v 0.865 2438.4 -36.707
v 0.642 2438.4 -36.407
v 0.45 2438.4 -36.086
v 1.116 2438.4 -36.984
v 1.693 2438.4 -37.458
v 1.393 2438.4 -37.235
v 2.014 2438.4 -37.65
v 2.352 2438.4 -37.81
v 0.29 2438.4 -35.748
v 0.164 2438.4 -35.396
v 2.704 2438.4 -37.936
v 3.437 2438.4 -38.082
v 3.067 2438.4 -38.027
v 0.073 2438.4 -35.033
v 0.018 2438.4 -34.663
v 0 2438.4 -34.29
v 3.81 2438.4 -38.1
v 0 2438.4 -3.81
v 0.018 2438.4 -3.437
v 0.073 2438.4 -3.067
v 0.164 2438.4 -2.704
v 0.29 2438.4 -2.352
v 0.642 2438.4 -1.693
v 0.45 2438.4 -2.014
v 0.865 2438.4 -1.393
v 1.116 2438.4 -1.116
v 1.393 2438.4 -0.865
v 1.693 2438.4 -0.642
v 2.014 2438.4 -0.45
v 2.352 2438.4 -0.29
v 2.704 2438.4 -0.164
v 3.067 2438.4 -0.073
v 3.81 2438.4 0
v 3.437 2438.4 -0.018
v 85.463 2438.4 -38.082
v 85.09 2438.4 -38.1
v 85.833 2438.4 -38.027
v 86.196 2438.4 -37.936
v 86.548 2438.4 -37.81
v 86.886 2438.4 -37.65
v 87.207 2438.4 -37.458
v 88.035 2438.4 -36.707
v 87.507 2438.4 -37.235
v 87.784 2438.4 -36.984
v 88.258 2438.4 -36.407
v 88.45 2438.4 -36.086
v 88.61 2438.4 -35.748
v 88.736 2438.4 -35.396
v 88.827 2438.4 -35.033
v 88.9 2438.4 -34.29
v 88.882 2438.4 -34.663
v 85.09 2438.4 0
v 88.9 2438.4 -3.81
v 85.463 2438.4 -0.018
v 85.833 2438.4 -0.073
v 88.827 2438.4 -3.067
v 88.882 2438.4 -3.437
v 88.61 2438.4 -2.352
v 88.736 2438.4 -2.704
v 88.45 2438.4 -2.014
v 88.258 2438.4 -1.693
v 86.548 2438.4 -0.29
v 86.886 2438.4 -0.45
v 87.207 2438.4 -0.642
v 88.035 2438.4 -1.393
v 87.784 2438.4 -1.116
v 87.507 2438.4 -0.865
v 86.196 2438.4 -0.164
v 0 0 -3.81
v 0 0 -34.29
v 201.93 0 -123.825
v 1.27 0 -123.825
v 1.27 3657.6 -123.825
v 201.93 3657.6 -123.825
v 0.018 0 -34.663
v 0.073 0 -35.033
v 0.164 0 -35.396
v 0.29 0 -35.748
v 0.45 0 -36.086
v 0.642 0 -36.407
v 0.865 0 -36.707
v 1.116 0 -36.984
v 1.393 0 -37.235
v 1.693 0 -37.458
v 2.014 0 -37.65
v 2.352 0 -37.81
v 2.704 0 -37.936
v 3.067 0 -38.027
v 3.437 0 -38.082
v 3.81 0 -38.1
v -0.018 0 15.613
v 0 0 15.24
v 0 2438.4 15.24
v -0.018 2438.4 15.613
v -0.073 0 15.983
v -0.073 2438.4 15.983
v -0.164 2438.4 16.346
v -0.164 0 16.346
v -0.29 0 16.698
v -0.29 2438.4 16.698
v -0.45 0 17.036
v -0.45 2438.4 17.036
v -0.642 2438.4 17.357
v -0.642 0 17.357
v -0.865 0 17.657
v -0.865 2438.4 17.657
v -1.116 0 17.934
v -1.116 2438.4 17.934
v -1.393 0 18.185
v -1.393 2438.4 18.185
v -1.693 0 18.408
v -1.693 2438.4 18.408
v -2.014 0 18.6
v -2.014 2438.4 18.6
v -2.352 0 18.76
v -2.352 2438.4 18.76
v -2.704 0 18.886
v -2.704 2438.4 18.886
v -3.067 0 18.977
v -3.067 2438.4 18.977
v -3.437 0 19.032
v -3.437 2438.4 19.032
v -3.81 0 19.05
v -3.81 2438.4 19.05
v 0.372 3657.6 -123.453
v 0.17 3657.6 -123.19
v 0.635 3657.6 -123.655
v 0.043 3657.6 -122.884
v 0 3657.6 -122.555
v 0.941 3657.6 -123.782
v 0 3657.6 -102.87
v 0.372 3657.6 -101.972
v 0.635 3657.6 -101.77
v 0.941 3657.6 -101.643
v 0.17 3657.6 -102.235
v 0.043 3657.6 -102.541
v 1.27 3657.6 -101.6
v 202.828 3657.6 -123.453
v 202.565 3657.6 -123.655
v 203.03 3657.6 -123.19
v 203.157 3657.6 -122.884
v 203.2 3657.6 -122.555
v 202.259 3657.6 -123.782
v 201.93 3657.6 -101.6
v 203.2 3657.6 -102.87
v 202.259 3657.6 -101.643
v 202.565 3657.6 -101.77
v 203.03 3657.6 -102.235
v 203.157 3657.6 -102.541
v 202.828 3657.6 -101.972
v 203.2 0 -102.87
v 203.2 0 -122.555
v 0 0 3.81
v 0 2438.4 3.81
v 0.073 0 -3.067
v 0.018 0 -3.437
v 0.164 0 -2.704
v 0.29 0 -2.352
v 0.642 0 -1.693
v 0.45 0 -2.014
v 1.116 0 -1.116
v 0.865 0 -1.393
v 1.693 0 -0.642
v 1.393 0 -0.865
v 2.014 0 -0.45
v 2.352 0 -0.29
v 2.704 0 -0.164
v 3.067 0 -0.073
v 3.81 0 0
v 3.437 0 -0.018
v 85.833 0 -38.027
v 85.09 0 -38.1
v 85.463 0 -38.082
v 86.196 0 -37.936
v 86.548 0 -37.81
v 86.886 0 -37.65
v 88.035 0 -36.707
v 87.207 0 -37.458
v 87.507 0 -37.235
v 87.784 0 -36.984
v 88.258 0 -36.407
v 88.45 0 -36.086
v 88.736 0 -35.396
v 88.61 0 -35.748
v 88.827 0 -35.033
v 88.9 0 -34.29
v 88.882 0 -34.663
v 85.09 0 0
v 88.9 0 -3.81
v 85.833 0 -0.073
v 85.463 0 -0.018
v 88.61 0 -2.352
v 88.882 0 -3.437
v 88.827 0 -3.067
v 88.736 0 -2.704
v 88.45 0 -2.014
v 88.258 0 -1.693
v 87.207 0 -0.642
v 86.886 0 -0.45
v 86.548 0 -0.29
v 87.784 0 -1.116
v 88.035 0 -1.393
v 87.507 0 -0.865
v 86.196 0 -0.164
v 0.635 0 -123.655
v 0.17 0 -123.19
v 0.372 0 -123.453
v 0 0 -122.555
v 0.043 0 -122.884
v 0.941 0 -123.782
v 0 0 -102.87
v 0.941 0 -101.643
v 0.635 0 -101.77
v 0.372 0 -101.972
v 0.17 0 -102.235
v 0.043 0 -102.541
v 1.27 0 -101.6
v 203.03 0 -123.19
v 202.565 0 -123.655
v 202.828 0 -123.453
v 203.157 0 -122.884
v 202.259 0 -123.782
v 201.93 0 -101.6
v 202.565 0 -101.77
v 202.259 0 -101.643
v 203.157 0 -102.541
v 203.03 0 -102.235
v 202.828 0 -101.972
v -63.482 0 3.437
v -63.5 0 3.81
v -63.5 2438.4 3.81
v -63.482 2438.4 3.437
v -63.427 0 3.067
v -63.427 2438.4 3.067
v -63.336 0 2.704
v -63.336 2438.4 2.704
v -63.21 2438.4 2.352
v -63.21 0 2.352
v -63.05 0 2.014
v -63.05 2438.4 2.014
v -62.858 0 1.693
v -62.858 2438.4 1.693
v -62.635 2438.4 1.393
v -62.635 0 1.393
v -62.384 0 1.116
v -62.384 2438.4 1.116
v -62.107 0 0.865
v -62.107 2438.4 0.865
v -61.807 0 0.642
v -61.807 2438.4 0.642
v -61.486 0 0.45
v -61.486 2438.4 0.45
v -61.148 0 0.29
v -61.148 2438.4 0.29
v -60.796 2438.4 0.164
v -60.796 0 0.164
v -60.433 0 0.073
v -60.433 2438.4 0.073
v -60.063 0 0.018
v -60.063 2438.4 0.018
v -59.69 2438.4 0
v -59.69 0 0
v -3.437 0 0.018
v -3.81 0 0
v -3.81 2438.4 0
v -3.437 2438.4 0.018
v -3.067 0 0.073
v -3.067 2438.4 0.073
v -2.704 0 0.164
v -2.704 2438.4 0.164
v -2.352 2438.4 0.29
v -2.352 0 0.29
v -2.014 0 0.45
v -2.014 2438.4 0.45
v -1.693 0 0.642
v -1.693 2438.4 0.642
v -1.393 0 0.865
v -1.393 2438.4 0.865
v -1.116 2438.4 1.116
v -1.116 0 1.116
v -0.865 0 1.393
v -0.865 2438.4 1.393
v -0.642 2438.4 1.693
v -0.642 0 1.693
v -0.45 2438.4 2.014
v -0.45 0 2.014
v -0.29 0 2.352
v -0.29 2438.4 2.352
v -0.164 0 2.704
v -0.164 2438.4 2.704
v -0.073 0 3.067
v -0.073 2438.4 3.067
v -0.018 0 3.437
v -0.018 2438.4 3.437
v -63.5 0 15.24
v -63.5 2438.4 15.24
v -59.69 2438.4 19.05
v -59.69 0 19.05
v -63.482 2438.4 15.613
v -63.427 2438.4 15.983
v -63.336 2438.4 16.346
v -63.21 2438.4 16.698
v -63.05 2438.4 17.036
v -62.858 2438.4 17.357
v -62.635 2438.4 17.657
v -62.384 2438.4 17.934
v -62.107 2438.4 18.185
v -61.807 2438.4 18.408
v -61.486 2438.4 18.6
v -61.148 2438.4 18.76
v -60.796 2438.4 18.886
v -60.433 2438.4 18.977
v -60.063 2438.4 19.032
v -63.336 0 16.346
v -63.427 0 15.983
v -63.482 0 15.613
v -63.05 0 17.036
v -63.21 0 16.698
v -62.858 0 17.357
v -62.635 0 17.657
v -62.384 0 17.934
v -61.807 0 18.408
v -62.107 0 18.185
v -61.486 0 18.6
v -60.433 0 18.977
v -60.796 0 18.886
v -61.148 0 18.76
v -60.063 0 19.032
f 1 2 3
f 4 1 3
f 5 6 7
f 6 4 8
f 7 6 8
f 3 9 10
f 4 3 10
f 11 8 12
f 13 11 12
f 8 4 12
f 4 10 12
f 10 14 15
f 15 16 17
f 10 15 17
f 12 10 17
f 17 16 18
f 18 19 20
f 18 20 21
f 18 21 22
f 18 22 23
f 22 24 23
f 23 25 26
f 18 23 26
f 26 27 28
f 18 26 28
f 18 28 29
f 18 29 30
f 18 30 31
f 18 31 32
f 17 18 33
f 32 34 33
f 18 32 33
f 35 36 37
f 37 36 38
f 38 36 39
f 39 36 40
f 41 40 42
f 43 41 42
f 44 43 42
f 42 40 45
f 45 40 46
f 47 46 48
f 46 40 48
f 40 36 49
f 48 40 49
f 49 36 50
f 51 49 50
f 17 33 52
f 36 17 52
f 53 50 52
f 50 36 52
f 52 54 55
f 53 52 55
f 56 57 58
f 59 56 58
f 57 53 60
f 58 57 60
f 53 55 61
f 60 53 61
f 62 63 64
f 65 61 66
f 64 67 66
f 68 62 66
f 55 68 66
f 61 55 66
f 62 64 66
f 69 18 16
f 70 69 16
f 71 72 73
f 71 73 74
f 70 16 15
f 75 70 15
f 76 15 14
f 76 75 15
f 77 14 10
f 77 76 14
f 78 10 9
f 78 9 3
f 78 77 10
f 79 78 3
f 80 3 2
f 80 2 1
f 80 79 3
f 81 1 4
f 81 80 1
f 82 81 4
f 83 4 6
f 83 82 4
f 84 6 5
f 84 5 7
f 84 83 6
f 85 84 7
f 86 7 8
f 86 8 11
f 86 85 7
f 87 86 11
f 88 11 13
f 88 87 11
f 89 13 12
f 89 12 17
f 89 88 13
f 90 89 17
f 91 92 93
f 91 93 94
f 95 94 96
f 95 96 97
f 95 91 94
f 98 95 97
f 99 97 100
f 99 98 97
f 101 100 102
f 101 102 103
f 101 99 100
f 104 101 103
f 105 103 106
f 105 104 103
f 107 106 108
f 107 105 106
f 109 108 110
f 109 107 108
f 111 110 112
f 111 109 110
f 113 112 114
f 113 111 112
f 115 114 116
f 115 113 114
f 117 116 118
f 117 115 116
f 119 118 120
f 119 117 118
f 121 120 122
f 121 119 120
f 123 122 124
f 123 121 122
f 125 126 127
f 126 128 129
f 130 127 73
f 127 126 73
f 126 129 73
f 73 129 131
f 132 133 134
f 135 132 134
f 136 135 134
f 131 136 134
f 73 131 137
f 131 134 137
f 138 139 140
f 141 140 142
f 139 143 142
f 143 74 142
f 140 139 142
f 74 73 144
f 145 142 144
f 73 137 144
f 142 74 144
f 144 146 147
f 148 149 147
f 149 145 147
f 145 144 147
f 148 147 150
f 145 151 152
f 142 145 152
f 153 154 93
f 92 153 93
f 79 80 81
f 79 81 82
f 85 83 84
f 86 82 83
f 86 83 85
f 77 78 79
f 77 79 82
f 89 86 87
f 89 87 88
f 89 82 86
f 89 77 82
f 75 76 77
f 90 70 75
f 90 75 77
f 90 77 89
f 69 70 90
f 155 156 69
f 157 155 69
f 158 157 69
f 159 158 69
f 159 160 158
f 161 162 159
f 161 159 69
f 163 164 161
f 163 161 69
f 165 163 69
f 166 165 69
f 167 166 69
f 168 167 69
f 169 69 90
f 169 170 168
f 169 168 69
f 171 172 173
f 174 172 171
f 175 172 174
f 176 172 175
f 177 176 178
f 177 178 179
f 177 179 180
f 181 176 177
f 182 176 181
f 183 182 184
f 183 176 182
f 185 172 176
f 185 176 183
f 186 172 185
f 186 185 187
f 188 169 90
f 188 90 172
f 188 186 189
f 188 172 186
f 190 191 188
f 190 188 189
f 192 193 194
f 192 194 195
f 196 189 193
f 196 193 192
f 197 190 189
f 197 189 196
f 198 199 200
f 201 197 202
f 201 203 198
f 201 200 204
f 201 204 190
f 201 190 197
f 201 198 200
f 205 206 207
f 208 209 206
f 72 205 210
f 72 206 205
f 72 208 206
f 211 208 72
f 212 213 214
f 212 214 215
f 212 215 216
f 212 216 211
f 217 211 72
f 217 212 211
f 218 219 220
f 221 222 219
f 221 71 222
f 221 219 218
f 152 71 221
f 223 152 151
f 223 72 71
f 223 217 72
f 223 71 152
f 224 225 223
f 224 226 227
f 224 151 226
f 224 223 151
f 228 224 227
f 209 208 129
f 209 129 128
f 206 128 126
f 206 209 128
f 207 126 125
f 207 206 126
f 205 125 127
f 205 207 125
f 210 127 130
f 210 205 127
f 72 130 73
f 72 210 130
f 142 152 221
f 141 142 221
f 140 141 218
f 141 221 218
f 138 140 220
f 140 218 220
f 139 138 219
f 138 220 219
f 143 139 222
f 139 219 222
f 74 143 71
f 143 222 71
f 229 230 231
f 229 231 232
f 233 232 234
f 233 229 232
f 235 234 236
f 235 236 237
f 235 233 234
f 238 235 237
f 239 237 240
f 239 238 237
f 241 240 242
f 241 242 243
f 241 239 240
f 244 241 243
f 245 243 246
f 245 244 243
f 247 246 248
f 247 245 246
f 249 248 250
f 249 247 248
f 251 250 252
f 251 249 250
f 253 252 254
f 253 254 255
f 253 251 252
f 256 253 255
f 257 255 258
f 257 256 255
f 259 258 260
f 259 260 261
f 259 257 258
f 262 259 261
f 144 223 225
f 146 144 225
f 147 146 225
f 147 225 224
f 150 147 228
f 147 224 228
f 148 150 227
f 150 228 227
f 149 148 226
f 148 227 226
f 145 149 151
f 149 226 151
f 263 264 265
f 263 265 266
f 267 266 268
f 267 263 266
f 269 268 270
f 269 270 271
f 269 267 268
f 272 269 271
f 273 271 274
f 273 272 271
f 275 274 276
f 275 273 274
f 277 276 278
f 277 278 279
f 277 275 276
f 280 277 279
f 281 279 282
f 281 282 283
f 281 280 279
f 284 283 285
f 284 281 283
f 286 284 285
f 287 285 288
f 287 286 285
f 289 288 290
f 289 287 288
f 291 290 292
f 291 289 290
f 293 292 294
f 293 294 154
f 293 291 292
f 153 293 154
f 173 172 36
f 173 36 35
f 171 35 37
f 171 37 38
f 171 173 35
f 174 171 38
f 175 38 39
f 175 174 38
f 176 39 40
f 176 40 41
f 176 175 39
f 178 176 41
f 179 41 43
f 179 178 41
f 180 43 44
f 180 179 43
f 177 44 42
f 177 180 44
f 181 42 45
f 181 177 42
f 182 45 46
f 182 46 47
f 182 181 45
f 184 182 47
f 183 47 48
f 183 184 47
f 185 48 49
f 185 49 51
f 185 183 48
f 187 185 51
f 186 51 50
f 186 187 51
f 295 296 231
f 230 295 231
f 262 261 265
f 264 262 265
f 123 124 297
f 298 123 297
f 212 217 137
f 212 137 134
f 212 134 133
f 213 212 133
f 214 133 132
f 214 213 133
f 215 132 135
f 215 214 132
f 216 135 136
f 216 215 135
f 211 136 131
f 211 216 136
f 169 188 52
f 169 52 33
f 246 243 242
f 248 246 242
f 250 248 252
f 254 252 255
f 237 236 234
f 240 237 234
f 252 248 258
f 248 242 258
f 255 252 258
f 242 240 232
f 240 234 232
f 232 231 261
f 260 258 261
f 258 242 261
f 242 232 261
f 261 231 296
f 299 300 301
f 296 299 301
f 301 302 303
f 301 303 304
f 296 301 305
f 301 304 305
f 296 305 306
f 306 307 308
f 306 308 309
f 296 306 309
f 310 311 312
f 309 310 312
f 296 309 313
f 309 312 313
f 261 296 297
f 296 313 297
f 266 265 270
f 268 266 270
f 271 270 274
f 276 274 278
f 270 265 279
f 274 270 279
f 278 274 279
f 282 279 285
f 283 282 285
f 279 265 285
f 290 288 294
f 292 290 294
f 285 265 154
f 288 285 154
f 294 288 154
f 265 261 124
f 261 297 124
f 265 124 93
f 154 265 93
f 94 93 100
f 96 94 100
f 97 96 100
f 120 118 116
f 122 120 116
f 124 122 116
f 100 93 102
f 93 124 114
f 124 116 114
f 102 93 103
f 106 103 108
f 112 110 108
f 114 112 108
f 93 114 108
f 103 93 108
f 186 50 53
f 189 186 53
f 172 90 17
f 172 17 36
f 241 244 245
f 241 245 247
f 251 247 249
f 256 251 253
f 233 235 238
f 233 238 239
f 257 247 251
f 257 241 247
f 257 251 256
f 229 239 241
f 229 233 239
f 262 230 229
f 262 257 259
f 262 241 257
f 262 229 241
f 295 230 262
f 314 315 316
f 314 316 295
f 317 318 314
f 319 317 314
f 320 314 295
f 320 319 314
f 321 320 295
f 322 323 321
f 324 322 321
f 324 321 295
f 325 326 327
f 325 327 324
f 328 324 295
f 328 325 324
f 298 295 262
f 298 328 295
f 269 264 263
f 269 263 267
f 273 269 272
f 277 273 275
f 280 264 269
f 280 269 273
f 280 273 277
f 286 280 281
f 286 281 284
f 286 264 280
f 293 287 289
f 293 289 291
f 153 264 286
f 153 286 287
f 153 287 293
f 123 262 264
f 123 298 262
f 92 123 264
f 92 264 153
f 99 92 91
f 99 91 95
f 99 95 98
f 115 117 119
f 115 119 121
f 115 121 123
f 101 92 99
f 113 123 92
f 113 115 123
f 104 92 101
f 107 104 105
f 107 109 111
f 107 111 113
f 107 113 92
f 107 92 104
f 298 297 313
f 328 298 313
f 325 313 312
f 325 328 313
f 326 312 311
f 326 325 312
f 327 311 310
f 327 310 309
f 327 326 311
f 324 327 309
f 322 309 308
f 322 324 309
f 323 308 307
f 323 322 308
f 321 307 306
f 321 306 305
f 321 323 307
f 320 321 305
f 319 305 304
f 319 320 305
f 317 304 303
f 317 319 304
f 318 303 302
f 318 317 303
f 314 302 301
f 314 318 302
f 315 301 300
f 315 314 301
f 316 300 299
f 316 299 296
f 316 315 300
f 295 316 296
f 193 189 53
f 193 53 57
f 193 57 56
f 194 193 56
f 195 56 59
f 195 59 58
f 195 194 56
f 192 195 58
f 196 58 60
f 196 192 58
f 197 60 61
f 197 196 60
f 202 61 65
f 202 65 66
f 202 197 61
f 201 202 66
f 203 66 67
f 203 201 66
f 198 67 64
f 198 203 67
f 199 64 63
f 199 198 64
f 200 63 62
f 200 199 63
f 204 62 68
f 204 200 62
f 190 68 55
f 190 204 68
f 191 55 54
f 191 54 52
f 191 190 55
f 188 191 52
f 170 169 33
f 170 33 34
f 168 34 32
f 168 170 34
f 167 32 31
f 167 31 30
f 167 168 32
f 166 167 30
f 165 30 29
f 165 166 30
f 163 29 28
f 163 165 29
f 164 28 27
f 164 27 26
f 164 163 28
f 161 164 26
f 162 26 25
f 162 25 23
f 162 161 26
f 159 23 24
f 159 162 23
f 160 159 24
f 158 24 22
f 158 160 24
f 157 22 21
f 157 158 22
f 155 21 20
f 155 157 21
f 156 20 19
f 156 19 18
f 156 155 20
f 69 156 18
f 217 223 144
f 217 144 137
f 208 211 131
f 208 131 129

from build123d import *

# Parameters (mm, degrees)
F1_DEPTH = 2438.4
F2_DEPTH = 2438.4
F3_DEPTH = 3657.6


# Not quite as in the source:
# - a pattern or mirror of a feature is missing from the dataset's text; its kind, count and spacing are read off the source's solid


with BuildPart() as f1:
    # F0 (on Front) → F1 (new body)
    with BuildSketch(Plane.XZ):
        with BuildLine():
            Line((85.09, 0), (3.81, 0))
            ThreePointArc((3.81, 0), (1.1159231637, -1.1159231637), (0, -3.81))
            Line((0, -3.81), (0, -34.29))
            ThreePointArc((0, -34.29), (1.1159231637, -36.9840768363), (3.81, -38.1))
            Line((3.81, -38.1), (85.09, -38.1))
            ThreePointArc((85.09, -38.1), (87.7840768363, -36.9840768363), (88.9, -34.29))
            Line((88.9, -34.29), (88.9, -3.81))
            ThreePointArc((88.9, -3.81), (87.7840768363, -1.1159231637), (85.09, 0))
        make_face()
    extrude(amount=-F1_DEPTH)


with BuildPart() as f2:
    # F0 (on Front) → F2 (new body)
    with BuildSketch(Plane.XZ):
        with BuildLine():
            Line((-59.69, 0), (-3.81, 0))
            ThreePointArc((-3.81, 0), (-1.1159231637, 1.1159231637), (0, 3.81))
            Line((0, 3.81), (0, 15.24))
            ThreePointArc((0, 15.24), (-1.1159231637, 17.9340768363), (-3.81, 19.05))
            Line((-3.81, 19.05), (-59.69, 19.05))
            ThreePointArc((-59.69, 19.05), (-62.3840768363, 17.9340768363), (-63.5, 15.24))
            Line((-63.5, 15.24), (-63.5, 3.81))
            ThreePointArc((-63.5, 3.81), (-62.3840768363, 1.1159231637), (-59.69, 0))
        make_face()
    extrude(amount=-F2_DEPTH)


with BuildPart() as f3:
    # F0 (on Front) → F3 (new body)
    with BuildSketch(Plane.XZ):
        with BuildLine():
            Line((176.53, -101.6), (1.27, -101.6))
            ThreePointArc((1.27, -101.6), (0.3719743879, -101.9719743879), (0, -102.87))
            Line((0, -102.87), (0, -122.555))
            ThreePointArc((0, -122.555), (0.3719743879, -123.4530256121), (1.27, -123.825))
            Line((1.27, -123.825), (176.53, -123.825))
            ThreePointArc((176.53, -123.825), (177.4280256121, -123.4530256121), (177.8, -122.555))
            Line((177.8, -122.555), (177.8, -102.87))
            ThreePointArc((177.8, -102.87), (177.4280256121, -101.9719743879), (176.53, -101.6))
        make_face()
    extrude(amount=-F3_DEPTH)

    # F3_copies: F3 across plane


with BuildPart() as f3_1:
    add(f3.part)
    add(f3.part.mirror(Plane(origin=(101.6, 0, 0), x_dir=(0, 0, 1), z_dir=(1, 0, 0))))


solid = Compound([f1.part, f2.part, f3_1.part])
